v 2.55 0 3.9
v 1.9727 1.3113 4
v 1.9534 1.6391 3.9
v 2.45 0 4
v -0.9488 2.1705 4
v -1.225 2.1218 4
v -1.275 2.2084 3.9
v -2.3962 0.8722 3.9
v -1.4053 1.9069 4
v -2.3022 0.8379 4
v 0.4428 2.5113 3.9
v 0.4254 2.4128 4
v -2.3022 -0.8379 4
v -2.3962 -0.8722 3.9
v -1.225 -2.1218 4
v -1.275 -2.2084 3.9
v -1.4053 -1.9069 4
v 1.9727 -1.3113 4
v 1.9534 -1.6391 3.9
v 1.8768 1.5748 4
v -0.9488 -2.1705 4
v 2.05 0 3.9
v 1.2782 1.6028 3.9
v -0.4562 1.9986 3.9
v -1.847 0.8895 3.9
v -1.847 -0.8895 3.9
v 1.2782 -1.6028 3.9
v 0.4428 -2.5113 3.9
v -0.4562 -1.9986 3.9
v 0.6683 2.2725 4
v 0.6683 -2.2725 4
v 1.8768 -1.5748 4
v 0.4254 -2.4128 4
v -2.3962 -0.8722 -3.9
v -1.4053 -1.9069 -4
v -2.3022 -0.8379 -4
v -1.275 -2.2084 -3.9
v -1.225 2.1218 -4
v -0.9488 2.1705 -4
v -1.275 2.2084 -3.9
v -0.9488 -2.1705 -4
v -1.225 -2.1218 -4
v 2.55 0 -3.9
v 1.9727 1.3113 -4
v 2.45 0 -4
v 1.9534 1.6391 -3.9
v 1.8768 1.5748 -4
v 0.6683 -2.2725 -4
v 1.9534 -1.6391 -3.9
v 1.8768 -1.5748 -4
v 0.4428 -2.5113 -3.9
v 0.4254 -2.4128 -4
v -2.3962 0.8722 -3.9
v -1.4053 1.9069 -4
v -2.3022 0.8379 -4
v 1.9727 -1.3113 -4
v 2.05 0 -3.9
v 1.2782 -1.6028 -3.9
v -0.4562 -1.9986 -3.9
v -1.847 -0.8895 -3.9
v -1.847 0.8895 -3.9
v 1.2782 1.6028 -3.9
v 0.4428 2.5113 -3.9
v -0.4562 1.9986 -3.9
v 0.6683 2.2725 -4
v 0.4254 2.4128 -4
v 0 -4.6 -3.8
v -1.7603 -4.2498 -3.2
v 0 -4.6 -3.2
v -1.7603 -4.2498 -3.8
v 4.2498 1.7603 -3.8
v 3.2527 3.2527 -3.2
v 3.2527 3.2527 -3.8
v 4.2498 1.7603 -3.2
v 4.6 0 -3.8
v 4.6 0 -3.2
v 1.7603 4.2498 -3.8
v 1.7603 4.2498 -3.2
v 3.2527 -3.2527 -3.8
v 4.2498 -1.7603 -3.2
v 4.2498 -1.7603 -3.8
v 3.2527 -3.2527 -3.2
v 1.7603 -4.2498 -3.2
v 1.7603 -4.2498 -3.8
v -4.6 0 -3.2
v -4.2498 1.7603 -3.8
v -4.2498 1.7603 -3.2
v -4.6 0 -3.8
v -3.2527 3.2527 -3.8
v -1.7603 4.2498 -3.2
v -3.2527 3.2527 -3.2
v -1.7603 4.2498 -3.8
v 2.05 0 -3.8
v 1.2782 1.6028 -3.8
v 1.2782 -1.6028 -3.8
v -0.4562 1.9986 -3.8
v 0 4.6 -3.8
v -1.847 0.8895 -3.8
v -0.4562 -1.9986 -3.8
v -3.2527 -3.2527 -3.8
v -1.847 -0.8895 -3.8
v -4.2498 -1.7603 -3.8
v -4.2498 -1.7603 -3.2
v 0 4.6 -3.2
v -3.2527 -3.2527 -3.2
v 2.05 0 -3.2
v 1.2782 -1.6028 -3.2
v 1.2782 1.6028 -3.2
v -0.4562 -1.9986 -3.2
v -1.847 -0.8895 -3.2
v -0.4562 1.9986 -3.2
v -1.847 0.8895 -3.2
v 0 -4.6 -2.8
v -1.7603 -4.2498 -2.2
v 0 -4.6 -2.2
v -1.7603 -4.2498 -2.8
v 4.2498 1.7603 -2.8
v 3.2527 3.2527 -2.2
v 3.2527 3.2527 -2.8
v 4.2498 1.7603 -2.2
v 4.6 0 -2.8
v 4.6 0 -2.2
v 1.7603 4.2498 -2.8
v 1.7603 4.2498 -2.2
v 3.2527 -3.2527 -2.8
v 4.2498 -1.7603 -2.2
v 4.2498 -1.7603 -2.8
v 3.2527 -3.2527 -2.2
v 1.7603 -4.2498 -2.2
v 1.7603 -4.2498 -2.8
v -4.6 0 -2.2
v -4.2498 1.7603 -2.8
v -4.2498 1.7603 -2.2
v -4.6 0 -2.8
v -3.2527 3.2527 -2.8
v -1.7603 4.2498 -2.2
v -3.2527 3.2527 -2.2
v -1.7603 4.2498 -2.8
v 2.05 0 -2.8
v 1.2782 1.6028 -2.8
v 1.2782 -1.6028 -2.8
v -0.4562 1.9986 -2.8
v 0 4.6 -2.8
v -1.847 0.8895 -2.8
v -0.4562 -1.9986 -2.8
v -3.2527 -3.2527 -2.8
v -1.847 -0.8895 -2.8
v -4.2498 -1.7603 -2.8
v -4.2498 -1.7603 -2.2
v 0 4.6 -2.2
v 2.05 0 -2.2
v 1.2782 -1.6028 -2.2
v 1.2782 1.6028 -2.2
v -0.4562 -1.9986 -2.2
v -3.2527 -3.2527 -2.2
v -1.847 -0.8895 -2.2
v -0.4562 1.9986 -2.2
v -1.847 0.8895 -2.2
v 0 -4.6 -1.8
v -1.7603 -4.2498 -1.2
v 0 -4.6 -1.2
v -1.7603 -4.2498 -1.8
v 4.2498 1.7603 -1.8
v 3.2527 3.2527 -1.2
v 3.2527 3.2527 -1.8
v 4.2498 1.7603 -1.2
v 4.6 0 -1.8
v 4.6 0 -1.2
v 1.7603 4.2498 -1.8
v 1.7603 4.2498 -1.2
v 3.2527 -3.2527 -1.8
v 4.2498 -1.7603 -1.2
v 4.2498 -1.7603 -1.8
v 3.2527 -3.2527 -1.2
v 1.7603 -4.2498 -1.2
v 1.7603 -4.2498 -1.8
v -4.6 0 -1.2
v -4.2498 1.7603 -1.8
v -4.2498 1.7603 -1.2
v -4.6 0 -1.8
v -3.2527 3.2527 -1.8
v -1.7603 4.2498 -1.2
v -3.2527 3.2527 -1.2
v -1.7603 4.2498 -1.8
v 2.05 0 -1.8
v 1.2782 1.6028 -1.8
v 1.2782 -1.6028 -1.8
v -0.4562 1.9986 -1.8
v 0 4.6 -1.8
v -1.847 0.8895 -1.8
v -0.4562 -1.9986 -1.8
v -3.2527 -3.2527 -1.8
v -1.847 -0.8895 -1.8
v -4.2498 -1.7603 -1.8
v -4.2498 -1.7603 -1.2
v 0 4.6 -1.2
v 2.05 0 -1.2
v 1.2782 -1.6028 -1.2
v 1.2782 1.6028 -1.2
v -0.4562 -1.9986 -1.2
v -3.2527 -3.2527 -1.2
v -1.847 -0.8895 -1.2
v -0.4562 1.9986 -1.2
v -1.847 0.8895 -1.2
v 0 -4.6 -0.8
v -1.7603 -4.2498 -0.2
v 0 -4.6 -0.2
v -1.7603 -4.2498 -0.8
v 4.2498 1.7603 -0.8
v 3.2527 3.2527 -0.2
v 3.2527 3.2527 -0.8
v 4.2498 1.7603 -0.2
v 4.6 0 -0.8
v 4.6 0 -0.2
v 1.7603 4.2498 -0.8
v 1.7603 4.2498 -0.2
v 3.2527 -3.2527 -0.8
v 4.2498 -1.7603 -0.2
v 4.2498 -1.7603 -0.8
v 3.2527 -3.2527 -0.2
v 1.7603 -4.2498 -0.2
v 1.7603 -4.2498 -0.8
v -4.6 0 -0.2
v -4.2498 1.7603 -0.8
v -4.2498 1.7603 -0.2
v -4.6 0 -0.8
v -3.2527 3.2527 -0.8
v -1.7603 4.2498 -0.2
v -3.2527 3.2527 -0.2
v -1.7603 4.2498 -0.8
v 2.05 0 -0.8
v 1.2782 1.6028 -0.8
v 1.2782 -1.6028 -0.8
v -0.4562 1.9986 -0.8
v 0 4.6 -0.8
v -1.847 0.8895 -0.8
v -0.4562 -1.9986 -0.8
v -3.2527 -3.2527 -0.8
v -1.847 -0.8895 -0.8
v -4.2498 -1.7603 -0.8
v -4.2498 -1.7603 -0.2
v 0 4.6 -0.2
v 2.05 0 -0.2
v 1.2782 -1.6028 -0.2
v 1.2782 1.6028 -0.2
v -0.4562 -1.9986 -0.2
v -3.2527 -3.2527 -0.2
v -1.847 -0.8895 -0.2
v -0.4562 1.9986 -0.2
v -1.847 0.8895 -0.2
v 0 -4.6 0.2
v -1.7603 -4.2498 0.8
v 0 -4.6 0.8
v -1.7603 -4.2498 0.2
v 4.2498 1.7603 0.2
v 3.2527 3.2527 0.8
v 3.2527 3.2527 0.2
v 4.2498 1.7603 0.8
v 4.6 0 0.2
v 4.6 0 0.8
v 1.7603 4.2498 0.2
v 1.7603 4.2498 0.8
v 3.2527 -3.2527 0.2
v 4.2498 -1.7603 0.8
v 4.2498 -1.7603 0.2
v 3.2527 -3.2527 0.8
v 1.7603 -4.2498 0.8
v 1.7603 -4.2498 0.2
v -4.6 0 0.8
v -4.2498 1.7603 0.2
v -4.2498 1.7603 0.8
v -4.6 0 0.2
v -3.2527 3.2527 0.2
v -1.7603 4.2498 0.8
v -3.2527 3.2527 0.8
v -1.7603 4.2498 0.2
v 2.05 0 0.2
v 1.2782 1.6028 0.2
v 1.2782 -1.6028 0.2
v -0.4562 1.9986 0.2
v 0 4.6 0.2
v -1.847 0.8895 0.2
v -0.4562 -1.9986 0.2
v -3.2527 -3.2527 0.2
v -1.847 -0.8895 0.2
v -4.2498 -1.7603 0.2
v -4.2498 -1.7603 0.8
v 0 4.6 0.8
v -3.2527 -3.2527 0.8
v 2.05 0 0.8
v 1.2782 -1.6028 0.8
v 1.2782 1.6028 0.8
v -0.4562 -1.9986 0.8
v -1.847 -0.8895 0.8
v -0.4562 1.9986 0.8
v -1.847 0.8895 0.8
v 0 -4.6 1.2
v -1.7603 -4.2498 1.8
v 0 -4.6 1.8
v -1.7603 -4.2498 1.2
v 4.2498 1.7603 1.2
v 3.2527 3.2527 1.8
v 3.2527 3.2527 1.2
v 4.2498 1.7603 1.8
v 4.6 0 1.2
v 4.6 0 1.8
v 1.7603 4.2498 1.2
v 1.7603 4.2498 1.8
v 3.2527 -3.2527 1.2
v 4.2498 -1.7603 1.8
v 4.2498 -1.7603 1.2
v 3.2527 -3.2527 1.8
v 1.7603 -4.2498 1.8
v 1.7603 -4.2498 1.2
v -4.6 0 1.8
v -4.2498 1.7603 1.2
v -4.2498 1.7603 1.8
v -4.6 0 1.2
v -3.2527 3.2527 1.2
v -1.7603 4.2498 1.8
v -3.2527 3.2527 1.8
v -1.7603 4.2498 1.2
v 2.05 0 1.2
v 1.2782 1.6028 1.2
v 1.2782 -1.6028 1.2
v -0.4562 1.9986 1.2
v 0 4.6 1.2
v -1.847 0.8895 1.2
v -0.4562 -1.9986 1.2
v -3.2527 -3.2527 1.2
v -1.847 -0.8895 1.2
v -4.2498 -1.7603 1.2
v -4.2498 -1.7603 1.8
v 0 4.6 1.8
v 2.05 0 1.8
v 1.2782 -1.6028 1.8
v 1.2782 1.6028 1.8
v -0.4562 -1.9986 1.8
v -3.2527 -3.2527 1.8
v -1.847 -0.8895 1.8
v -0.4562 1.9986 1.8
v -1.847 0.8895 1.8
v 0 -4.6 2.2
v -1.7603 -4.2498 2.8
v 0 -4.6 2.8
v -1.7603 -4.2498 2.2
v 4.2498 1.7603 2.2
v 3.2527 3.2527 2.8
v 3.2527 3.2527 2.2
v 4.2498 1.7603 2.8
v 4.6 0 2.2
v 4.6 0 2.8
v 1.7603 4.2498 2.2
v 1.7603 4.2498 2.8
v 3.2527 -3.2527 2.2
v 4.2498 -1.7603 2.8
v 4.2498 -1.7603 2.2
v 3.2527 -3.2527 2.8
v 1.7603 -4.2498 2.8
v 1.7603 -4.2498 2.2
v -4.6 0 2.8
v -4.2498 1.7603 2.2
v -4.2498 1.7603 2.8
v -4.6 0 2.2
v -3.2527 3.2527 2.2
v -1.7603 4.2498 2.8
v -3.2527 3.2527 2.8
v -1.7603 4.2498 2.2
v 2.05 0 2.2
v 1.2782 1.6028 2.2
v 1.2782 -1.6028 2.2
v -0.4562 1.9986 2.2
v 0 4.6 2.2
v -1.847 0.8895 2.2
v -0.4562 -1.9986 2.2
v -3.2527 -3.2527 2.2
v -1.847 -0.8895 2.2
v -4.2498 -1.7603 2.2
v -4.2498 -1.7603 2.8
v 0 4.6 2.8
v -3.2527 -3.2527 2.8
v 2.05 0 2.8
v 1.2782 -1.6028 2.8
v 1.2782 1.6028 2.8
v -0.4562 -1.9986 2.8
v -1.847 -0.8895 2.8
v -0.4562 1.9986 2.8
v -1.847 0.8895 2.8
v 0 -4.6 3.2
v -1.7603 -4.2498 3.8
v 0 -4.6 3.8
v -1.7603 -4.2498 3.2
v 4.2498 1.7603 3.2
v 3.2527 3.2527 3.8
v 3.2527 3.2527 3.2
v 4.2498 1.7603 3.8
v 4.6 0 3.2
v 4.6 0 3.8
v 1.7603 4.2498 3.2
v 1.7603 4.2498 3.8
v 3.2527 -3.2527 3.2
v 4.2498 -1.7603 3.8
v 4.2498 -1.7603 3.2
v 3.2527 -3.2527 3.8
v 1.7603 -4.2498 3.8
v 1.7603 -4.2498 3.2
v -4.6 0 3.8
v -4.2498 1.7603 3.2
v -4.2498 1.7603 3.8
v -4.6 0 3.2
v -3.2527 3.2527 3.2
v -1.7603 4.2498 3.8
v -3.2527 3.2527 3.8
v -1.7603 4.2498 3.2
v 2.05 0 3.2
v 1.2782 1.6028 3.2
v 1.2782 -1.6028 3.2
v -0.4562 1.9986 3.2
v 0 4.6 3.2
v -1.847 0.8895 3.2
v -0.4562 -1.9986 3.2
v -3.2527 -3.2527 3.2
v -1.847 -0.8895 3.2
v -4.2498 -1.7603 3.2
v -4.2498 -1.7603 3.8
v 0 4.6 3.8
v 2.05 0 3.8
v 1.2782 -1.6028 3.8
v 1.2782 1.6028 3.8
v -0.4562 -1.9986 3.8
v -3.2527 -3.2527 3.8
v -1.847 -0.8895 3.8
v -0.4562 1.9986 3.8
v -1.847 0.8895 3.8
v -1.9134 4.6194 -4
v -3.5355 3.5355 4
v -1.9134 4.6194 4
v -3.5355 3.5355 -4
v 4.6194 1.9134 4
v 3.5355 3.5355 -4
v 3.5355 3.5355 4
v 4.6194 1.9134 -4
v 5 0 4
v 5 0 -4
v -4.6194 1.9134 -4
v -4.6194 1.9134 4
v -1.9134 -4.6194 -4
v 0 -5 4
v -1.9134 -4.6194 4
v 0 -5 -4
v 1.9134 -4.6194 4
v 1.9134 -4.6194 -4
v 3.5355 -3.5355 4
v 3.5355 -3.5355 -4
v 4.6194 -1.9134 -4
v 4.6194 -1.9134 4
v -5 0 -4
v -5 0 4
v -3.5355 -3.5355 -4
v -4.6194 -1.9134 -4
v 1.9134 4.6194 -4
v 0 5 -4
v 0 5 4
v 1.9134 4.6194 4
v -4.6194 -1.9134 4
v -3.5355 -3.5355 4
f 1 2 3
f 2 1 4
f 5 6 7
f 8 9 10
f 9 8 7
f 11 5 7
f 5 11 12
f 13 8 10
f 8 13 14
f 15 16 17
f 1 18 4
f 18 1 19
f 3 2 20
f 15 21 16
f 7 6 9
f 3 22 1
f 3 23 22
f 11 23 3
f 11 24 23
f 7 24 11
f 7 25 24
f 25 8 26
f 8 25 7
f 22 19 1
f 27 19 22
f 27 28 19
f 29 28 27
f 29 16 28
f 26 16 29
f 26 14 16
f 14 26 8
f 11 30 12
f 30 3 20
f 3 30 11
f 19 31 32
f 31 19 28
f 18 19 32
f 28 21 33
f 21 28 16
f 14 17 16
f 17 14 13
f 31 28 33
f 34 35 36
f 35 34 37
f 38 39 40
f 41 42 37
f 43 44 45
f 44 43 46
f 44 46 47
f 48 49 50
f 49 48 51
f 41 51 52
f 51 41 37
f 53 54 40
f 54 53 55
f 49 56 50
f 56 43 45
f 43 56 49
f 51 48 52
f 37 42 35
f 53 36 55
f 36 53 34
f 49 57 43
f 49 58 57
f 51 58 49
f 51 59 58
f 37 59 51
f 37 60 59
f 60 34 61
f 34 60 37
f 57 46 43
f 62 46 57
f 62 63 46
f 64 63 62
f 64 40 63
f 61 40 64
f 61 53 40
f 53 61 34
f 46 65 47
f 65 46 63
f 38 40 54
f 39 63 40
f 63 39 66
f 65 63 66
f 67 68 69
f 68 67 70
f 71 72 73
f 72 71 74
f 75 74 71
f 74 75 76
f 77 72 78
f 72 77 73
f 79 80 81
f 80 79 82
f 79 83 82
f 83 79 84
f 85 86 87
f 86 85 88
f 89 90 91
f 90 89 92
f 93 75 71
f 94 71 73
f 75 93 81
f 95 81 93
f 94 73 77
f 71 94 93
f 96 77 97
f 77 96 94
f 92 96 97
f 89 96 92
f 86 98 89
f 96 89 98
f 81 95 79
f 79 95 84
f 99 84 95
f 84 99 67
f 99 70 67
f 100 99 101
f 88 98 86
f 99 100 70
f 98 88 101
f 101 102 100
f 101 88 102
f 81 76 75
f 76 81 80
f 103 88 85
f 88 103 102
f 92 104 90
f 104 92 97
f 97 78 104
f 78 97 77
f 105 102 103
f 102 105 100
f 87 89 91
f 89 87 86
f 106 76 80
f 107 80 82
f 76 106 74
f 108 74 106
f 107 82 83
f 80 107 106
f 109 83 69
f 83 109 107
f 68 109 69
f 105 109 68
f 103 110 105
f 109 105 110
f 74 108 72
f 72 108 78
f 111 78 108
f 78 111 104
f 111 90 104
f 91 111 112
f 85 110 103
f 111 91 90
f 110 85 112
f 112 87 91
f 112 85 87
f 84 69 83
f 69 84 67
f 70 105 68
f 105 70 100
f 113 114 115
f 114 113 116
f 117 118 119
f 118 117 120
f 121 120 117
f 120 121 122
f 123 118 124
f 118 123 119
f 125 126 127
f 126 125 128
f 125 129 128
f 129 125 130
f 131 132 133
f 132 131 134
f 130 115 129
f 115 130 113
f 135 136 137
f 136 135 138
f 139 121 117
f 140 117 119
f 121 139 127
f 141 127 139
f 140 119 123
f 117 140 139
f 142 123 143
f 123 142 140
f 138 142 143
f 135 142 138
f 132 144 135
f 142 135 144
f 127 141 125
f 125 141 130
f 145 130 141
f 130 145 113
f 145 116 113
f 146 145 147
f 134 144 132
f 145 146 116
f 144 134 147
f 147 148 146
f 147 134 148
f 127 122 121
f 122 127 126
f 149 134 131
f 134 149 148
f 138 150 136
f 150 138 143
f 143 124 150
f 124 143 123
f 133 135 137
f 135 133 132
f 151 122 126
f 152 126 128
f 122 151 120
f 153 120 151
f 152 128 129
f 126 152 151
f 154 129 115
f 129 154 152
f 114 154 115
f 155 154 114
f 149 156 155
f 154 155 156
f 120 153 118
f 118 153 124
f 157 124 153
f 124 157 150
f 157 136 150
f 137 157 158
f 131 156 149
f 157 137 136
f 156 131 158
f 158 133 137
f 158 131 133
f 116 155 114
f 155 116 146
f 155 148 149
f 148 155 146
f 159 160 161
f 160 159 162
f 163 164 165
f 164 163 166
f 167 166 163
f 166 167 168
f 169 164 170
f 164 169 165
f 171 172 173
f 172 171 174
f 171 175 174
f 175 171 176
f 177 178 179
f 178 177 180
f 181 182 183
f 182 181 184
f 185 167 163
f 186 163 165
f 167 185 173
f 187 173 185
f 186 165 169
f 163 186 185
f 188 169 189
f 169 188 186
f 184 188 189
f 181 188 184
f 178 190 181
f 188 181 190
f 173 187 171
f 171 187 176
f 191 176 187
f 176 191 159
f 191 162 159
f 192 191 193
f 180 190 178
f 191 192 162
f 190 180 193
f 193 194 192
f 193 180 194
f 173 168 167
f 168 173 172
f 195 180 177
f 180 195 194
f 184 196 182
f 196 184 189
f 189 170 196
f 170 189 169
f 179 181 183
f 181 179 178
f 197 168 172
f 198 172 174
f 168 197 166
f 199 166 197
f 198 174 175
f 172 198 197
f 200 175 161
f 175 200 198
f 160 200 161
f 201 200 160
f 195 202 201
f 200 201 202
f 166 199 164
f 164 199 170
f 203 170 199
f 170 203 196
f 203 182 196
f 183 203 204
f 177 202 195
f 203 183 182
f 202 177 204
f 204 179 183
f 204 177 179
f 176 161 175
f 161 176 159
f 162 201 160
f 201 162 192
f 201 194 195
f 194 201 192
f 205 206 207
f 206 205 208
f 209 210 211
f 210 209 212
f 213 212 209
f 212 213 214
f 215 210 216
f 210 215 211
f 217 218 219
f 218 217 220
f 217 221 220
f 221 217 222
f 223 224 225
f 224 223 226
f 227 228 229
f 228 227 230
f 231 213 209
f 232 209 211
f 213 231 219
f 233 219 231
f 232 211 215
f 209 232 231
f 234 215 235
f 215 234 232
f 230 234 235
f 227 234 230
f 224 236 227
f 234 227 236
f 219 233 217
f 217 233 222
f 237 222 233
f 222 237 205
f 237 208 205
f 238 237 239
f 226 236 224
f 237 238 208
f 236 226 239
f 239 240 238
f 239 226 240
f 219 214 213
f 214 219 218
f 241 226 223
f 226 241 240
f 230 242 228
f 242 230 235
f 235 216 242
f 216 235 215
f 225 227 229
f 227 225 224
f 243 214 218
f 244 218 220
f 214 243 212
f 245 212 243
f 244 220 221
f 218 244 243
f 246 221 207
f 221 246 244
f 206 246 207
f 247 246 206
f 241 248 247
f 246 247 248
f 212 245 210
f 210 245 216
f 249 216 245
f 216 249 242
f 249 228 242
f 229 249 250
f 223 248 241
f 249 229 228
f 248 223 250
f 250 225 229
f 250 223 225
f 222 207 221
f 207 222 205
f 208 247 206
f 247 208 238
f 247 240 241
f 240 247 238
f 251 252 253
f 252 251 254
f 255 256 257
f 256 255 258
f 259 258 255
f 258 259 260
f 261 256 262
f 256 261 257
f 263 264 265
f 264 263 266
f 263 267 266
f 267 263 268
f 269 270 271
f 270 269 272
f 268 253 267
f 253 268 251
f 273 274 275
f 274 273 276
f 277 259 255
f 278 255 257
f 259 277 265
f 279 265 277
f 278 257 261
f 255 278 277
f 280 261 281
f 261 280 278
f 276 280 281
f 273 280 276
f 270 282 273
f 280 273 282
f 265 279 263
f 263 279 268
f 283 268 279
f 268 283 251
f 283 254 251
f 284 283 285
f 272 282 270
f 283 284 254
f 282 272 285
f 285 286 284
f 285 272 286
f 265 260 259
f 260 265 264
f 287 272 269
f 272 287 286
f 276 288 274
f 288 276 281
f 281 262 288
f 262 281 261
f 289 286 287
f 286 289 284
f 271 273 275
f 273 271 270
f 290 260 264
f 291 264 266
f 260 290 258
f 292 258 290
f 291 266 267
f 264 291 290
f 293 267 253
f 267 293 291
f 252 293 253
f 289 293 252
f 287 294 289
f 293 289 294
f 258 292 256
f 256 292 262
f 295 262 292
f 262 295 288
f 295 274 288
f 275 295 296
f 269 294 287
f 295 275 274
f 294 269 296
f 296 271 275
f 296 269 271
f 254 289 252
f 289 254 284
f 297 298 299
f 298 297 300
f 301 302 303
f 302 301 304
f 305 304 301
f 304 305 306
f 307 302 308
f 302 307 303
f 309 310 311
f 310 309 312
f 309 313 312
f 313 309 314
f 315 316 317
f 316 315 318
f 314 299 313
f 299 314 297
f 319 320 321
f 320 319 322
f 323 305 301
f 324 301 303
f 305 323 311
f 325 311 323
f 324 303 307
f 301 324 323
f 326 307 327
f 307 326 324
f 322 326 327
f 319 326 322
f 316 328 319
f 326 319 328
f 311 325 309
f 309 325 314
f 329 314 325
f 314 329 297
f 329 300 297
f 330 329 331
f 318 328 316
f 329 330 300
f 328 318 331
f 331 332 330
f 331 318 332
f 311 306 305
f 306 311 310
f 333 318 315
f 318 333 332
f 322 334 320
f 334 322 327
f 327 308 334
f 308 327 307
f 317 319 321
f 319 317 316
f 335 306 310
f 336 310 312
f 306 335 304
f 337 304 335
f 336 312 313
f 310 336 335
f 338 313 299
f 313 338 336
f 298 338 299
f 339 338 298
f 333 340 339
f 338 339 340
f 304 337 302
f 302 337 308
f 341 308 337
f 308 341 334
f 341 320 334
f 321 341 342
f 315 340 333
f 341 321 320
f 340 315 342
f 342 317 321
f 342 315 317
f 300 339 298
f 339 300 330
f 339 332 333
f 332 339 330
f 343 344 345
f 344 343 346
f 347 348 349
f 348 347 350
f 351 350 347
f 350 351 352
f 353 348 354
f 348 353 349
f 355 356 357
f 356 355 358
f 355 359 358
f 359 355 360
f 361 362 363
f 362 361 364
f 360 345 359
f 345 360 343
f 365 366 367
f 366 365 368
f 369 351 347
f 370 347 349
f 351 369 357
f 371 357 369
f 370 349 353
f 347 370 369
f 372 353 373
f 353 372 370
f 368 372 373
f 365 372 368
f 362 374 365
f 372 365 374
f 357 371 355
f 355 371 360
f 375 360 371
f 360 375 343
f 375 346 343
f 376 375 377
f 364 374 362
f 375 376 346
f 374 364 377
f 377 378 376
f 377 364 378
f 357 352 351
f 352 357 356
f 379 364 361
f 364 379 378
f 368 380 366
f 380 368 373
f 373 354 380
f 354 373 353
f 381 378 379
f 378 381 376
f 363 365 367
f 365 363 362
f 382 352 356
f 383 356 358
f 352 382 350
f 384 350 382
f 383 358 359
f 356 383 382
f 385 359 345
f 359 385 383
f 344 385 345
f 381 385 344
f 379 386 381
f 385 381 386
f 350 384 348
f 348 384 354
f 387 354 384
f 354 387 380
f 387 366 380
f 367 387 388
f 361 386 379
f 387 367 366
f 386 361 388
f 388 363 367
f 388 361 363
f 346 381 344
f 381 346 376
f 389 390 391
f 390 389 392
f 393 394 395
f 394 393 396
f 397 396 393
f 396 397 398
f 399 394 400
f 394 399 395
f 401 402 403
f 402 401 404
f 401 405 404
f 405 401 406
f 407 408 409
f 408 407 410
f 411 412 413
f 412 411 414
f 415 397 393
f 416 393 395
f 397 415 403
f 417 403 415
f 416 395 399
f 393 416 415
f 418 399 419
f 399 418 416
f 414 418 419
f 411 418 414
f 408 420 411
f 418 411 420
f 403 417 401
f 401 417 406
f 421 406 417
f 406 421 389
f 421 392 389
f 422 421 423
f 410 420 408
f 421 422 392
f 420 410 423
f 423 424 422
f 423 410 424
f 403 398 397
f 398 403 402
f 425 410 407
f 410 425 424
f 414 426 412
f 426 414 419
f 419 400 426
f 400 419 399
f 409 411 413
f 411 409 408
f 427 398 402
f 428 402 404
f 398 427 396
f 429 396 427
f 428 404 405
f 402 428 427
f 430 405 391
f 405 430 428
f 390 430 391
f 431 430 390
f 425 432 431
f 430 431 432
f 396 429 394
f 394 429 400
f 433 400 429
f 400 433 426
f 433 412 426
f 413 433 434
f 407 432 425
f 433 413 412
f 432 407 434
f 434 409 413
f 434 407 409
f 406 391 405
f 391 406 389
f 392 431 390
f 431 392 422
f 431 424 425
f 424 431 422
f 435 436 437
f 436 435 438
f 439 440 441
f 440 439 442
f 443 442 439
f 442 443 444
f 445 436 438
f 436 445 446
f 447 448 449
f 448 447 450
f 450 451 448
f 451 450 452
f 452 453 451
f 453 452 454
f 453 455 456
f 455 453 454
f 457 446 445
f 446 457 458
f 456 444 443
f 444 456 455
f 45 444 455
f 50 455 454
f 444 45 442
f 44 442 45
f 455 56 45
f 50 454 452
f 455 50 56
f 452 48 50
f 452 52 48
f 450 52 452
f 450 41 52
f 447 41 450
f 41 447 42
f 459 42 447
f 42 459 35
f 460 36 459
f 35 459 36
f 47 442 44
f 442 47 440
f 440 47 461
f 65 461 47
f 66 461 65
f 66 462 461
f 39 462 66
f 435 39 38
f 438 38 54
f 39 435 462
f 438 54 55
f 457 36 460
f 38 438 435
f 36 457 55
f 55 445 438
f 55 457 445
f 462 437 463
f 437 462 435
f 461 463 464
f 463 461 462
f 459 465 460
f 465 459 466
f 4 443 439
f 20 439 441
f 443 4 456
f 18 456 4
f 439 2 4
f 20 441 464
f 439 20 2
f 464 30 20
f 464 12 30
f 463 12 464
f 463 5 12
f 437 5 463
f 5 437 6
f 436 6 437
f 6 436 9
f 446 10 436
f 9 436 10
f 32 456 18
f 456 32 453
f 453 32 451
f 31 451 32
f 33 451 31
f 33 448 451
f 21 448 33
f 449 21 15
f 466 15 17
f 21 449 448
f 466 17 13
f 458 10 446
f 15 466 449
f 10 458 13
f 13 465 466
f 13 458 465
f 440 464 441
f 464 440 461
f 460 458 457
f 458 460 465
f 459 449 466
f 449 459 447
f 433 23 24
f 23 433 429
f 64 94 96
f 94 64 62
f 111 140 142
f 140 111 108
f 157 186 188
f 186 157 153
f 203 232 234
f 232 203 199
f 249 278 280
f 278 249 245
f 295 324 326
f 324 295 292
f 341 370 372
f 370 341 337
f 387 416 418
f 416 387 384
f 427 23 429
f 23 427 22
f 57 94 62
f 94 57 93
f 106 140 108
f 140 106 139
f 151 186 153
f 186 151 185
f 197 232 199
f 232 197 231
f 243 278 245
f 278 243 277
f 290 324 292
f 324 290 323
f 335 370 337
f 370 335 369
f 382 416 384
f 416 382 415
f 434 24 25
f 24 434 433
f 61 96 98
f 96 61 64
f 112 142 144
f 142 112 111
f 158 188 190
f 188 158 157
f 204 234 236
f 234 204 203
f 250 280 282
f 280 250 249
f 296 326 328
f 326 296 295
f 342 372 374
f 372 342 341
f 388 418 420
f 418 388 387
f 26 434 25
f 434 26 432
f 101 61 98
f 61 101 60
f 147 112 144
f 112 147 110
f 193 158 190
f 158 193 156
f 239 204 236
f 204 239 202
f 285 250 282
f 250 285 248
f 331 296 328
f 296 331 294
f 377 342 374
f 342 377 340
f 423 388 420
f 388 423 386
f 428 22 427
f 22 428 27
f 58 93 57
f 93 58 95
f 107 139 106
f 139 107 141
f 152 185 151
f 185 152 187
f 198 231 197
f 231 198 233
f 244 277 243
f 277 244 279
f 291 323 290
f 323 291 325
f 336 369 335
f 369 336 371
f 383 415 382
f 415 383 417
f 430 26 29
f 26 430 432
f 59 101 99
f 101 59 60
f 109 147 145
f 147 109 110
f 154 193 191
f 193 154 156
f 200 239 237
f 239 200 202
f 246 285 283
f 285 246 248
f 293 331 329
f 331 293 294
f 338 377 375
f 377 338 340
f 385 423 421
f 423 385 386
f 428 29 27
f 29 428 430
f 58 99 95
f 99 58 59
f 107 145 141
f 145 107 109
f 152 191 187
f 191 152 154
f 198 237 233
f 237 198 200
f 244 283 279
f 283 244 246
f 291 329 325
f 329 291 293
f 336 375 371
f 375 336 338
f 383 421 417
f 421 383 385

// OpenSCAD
// Parameters
outer_diameter_mm = 10; //[5:20:0.1]
length_mm = 8; //[4:16:0.1]
screw_diameter_mm = 4; //[2:8:0.1]
inner_thread_pitch_mm = 0.7; //[0.35:1.4:0.05]
tolerance_mm = 0.1; //[0.05:0.3:0.01]
chamfer_mm = 0.5; //[0.2:1.5:0.1]
knurl_depth_mm = 0.4; //[0.2:1:0.05]
knurl_pitch_mm = 1; //[0.5:2:0.1]
knurl_tooth_width_mm = 0.6; //[0.3:1.2:0.05]
knurl_count = 8; //[4:20:1]
overlap_mm = 0.8; //[0.5:2:0.1]

// Threaded Insert - complete geometry
module threaded_insert() {
  color([0.8, 0.6, 0.2]) { // Brass color
    difference() {
      // Insert body
      cylinder(r=outer_diameter_mm/2, h=length_mm, center=true);

      // Internal thread or clearance bore
      translate([0, 0, 0])
        cylinder(r=(screw_diameter_mm + tolerance_mm)/2, h=length_mm + 2*overlap_mm, center=true);

      // Lead-in chamfers
      union() {
        translate([0, 0, length_mm/2 - chamfer_mm/2 + overlap_mm/2])
          cylinder(r1=(screw_diameter_mm + tolerance_mm)/2 + chamfer_mm, r2=(screw_diameter_mm + tolerance_mm)/2, h=chamfer_mm, center=true);
        translate([0, 0, -length_mm/2 + chamfer_mm/2 - overlap_mm/2])
          cylinder(r1=(screw_diameter_mm + tolerance_mm)/2, r2=(screw_diameter_mm + tolerance_mm)/2 + chamfer_mm, h=chamfer_mm, center=true);
      }

      // Knurl rings
      for (i = [0:knurl_count-1]) {
        translate([0, 0, -length_mm/2 + chamfer_mm + knurl_pitch_mm*i])
          scale([(outer_diameter_mm - 2*knurl_depth_mm)/outer_diameter_mm, (outer_diameter_mm - 2*knurl_depth_mm)/outer_diameter_mm, 1])
          cylinder(r=outer_diameter_mm/2, h=knurl_tooth_width_mm, center=true);
      }
    }
  }
}

// Assembly
module assembly() {
  threaded_insert();
}

assembly();
